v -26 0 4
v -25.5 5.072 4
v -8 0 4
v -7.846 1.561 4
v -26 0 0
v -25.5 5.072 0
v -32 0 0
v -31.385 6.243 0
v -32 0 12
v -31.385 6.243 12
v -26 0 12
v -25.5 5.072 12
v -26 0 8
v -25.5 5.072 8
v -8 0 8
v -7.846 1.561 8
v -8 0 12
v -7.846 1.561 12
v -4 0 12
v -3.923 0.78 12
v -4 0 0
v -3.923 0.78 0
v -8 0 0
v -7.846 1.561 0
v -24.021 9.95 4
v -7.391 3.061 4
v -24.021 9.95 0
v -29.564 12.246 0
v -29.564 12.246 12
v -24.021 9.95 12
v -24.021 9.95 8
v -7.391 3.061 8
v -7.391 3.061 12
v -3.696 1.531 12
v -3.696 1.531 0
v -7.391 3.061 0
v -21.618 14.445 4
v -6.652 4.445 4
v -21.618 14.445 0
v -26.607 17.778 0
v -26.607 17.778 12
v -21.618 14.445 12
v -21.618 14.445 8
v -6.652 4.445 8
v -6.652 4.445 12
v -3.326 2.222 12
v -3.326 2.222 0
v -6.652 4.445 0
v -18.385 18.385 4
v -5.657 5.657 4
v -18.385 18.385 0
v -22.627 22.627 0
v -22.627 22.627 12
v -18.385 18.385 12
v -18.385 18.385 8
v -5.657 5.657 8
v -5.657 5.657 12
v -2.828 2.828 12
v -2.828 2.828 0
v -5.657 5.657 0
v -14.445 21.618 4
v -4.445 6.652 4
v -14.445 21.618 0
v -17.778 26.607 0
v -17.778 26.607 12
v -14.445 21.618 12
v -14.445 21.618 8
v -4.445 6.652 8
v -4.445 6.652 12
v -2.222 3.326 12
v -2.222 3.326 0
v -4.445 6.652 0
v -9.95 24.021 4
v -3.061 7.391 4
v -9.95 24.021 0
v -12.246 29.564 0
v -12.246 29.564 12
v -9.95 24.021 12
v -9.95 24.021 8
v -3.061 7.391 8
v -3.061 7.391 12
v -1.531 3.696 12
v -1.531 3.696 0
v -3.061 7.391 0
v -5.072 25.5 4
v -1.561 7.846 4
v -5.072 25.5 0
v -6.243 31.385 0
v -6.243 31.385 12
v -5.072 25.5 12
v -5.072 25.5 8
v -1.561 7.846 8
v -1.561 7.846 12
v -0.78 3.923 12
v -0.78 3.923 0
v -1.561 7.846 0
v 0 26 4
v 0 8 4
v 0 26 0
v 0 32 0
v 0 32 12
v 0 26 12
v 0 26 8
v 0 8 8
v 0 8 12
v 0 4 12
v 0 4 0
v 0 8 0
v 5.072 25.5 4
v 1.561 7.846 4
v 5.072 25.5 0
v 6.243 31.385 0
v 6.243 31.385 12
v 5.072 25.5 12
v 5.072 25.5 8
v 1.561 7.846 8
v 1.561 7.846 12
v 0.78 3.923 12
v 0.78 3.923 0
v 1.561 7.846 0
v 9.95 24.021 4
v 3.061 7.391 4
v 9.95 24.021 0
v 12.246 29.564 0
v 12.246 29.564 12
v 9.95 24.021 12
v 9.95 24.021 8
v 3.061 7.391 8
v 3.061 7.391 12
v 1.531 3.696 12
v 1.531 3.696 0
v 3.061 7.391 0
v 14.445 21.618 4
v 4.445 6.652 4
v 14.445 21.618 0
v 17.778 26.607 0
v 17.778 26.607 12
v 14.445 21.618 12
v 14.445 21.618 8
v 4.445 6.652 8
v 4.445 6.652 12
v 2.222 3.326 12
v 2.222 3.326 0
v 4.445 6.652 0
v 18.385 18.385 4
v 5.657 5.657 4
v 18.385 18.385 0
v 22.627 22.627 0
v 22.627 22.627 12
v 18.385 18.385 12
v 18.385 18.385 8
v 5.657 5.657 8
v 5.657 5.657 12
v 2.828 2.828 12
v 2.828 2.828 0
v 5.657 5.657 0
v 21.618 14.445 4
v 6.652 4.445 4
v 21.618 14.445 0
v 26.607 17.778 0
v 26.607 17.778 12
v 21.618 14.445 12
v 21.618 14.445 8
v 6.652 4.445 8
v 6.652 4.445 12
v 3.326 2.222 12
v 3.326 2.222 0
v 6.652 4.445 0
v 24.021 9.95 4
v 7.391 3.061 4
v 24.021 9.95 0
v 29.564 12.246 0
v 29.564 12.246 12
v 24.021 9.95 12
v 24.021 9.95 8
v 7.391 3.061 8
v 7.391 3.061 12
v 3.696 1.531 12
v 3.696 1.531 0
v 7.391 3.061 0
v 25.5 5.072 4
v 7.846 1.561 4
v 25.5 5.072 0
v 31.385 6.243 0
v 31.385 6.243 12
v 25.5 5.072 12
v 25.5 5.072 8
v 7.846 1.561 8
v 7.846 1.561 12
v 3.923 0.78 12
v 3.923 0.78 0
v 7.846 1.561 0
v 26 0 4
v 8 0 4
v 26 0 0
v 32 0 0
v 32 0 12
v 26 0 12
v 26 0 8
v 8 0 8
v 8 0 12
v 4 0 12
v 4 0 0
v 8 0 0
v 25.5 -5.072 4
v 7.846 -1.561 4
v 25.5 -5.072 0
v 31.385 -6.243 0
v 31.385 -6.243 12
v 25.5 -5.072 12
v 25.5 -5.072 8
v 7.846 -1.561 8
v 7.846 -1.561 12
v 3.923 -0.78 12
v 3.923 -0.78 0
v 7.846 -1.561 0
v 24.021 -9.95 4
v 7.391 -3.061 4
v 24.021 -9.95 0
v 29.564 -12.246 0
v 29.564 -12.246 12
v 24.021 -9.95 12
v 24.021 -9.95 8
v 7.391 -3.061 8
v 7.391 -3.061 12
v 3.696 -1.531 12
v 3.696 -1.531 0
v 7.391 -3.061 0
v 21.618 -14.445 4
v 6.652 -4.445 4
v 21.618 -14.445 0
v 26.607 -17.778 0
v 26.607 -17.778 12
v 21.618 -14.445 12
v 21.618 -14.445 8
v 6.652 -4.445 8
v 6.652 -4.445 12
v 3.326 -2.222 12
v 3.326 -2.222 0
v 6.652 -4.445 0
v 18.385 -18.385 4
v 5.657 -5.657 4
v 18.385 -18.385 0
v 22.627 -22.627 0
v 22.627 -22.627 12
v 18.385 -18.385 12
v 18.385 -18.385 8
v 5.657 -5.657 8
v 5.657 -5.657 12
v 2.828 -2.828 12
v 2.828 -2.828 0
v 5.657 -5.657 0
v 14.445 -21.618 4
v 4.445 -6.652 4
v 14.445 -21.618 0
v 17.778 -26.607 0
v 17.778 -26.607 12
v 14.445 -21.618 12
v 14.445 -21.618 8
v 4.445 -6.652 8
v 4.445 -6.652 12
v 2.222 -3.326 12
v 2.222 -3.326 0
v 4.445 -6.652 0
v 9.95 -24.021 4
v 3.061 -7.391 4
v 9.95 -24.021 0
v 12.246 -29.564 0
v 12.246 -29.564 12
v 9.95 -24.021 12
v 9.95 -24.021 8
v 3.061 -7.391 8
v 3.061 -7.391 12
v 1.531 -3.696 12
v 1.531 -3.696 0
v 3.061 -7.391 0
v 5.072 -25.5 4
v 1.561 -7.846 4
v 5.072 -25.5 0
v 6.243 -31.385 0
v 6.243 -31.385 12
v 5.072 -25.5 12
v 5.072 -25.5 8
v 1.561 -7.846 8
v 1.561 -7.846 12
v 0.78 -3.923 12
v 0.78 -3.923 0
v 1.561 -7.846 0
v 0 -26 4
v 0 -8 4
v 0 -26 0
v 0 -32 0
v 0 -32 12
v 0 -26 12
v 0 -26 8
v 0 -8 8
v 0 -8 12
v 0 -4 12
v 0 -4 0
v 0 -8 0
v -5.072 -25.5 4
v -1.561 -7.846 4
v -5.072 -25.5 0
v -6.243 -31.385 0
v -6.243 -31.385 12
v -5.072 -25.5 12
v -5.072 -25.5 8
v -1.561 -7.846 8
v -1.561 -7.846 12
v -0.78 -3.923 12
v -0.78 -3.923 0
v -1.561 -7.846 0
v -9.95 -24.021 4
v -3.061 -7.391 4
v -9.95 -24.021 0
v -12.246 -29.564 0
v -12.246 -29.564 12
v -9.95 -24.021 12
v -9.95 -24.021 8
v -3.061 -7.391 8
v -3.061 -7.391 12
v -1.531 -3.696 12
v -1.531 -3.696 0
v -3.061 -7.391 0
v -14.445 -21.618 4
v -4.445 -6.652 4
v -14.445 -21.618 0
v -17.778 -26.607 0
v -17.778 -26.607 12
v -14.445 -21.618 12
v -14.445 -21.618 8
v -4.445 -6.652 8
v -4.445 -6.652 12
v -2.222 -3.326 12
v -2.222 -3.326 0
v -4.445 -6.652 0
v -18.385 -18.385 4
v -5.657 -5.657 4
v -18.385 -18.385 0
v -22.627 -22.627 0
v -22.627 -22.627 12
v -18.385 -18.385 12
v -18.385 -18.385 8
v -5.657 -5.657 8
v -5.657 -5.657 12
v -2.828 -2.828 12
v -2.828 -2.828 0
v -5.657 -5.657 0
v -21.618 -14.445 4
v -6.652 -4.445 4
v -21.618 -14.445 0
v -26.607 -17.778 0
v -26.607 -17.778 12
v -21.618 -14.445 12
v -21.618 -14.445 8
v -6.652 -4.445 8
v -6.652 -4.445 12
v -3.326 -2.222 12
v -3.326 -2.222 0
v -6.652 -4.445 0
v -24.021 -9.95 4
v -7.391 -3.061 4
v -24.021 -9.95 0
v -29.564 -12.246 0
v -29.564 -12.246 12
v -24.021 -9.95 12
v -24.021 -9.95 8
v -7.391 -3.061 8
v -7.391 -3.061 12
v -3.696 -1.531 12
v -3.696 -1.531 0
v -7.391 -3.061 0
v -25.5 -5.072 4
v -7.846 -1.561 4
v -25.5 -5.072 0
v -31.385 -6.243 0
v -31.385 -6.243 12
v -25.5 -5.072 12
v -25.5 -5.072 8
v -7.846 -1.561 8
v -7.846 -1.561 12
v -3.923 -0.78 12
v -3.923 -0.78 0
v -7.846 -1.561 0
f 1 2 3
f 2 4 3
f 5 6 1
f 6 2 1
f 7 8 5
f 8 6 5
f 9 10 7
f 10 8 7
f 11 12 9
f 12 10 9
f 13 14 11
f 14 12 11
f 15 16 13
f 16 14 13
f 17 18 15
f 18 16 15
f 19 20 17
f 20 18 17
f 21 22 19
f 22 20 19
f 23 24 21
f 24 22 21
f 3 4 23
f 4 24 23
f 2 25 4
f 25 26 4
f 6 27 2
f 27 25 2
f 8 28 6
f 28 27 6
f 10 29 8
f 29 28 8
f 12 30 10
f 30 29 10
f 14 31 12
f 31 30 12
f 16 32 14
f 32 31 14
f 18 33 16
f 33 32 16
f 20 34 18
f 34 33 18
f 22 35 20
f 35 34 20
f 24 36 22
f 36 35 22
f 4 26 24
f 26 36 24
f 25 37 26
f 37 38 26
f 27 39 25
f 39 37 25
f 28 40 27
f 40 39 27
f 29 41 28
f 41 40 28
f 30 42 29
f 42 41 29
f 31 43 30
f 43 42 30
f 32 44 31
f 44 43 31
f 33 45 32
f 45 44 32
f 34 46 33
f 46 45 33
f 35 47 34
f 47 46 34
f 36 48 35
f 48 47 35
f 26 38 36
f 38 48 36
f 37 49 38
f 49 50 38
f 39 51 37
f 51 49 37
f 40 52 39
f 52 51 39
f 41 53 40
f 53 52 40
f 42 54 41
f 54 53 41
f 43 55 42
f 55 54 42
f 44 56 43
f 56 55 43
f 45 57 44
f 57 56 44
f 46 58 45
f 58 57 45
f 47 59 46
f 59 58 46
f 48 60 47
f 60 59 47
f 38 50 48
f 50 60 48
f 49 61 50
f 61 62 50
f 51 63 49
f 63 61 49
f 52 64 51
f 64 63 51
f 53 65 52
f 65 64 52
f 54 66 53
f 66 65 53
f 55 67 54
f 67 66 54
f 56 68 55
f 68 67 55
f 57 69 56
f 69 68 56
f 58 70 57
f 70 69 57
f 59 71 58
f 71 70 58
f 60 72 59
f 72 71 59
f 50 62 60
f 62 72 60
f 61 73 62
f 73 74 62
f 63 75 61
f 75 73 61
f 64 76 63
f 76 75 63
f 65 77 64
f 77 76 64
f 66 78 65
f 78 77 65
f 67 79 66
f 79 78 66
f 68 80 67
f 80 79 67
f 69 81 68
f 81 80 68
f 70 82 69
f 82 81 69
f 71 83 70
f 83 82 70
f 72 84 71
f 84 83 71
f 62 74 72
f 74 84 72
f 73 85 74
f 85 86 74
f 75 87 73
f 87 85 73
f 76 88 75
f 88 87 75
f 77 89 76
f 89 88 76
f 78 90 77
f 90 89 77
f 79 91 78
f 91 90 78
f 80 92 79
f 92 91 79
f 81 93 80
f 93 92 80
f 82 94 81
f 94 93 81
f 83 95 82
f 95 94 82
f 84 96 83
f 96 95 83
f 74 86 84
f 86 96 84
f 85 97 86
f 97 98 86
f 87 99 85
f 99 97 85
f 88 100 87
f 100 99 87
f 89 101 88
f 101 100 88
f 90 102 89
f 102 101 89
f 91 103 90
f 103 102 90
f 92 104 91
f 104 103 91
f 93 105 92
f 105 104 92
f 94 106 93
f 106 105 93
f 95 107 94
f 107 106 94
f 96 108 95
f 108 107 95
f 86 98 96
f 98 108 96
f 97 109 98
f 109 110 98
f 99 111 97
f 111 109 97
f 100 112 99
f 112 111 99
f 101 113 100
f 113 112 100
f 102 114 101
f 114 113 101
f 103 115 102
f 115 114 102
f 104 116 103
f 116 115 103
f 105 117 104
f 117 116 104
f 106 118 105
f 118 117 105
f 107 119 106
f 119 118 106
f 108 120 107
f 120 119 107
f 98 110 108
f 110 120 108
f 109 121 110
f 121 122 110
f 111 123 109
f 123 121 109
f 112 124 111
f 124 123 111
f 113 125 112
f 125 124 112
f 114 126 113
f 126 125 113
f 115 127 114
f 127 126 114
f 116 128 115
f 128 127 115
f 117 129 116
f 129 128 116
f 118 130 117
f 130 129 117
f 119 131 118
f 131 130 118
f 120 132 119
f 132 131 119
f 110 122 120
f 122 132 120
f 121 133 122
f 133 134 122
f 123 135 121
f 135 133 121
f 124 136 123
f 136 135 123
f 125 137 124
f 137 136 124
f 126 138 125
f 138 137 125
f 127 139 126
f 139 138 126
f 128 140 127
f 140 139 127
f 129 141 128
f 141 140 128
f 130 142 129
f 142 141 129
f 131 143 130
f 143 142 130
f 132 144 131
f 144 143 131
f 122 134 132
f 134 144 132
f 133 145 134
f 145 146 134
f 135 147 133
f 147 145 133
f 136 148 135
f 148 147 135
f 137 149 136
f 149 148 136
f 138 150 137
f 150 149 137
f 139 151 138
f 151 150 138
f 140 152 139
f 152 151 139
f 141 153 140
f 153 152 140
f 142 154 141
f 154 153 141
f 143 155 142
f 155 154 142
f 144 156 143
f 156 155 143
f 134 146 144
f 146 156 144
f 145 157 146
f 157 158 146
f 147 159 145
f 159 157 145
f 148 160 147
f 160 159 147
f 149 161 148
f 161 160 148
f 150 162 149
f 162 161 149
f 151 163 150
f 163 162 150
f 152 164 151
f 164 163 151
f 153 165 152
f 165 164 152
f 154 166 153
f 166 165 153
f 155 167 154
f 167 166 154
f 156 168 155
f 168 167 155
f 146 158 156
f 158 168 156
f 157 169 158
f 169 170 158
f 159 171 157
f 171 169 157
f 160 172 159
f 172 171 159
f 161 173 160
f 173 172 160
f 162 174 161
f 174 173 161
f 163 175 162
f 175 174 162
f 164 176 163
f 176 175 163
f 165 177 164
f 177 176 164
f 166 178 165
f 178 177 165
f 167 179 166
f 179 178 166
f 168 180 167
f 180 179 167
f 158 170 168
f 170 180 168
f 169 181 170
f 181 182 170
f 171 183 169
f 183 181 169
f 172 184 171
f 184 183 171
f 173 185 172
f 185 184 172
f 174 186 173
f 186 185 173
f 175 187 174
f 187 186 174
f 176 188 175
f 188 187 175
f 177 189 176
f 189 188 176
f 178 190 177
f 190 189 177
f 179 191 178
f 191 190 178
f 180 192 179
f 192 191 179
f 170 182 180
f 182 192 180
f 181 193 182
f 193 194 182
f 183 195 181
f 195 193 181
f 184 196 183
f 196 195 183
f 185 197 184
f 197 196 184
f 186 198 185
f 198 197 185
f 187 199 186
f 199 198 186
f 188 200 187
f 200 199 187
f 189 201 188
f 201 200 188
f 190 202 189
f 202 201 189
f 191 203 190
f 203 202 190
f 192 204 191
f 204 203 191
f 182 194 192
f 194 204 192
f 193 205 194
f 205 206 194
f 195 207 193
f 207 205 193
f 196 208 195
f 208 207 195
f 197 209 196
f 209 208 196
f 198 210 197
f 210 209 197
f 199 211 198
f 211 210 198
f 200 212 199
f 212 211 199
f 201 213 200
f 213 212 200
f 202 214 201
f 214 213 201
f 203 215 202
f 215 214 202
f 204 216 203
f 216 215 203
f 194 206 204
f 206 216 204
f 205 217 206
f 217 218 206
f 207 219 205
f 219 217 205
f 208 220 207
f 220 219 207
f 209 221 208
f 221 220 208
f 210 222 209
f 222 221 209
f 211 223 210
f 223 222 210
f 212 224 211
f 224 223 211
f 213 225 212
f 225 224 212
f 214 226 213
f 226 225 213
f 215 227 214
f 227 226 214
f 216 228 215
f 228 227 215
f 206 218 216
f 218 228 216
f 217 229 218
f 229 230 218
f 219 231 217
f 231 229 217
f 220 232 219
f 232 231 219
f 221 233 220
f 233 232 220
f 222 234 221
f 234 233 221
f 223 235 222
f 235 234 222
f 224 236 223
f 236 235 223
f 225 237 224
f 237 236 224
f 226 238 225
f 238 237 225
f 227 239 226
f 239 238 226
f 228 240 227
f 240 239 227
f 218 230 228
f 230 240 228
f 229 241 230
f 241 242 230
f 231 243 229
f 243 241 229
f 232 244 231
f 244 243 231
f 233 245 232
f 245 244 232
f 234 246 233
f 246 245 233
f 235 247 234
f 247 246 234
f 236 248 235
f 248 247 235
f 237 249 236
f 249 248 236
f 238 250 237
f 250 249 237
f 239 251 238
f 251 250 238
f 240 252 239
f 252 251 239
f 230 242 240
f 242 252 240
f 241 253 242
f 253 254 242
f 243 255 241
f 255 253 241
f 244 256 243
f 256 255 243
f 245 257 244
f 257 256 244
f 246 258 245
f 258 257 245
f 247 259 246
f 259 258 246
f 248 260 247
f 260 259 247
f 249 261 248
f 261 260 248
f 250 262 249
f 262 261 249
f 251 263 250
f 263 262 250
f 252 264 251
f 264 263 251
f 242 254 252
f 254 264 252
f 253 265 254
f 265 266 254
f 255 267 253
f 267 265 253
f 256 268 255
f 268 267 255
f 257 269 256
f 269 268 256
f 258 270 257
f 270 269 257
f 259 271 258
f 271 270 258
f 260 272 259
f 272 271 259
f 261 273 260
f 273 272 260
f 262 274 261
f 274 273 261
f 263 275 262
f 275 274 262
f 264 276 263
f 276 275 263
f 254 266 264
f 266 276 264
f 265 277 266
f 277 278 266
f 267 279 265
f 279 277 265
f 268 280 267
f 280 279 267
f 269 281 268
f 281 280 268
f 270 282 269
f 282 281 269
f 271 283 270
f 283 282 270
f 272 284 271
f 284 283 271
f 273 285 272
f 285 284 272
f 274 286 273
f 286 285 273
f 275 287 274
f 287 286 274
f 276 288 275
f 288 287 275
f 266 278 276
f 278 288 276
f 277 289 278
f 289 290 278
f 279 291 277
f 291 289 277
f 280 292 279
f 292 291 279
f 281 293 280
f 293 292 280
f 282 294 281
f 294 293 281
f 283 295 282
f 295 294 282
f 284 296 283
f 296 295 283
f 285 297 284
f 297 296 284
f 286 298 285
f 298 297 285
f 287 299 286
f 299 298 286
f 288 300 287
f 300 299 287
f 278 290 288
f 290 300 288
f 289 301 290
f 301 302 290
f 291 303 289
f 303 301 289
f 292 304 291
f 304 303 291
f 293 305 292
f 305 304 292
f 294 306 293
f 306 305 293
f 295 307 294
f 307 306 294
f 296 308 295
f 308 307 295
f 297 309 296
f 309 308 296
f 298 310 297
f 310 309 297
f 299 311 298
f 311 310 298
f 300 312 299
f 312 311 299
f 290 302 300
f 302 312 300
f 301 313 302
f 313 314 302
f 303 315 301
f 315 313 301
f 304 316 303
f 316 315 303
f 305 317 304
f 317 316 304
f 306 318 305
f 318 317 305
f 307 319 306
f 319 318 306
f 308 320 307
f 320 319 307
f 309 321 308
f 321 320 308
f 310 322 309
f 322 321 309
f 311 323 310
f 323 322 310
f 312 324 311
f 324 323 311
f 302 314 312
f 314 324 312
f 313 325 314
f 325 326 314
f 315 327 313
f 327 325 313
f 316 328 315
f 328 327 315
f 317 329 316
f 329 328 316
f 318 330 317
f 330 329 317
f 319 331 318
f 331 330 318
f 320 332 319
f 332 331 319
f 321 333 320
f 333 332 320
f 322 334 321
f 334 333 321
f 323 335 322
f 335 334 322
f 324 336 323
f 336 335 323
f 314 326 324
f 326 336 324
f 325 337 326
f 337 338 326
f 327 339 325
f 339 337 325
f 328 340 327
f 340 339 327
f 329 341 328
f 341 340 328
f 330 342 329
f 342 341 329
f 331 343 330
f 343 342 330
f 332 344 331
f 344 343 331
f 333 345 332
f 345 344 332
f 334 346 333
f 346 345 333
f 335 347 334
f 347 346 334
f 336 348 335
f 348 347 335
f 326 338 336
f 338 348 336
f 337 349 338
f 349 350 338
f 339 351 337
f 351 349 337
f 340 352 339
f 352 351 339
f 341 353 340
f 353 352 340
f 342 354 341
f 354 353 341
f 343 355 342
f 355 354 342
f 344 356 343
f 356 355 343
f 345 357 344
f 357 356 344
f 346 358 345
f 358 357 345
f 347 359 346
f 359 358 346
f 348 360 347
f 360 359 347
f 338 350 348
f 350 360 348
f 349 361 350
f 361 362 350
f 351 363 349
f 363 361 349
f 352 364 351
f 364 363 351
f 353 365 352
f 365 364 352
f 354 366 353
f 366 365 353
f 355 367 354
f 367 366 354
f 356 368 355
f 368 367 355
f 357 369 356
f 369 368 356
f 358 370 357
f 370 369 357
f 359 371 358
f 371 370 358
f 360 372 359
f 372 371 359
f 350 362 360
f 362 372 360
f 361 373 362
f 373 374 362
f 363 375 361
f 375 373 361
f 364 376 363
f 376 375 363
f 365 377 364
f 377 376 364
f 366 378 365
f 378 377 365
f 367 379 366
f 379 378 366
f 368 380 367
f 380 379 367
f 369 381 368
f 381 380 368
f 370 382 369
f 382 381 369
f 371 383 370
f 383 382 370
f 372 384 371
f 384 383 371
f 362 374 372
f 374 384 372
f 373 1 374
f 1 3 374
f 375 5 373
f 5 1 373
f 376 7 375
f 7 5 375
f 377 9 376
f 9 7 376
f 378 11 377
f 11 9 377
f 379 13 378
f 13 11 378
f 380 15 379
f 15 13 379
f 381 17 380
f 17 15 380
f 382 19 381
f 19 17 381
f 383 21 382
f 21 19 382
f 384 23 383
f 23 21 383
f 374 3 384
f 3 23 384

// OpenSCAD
$fn = 32;

// ----------------------------------------------------------------------
// Revolved part: handwheel R32
// ----------------------------------------------------------------------

// --- parameters (mm) ---
bore_r = 4;               // bore radius
rim_r = 32;               // rim radius
rim_w = 6;                // rim axial width
rim_t = 12;               // rim diameter height
hub_r = 8;                // hub radius
web_t = 4;                // web thickness
revolve_angle = 360;      // revolve sweep, degrees

bore_d = 2 * bore_r;
rim_d = 2 * rim_r;
hub_d = 2 * hub_r;

profile = [[4, 0], [8, 0], [8, 4], [26, 4], [26, 0], [32, 0], [32, 12], [26, 12], [26, 8], [8, 8], [8, 12], [4, 12]];  // primary outline, 12 points, counter clockwise

// --- the one profile operation ---
rotate_extrude(angle = revolve_angle) polygon(points = profile);
